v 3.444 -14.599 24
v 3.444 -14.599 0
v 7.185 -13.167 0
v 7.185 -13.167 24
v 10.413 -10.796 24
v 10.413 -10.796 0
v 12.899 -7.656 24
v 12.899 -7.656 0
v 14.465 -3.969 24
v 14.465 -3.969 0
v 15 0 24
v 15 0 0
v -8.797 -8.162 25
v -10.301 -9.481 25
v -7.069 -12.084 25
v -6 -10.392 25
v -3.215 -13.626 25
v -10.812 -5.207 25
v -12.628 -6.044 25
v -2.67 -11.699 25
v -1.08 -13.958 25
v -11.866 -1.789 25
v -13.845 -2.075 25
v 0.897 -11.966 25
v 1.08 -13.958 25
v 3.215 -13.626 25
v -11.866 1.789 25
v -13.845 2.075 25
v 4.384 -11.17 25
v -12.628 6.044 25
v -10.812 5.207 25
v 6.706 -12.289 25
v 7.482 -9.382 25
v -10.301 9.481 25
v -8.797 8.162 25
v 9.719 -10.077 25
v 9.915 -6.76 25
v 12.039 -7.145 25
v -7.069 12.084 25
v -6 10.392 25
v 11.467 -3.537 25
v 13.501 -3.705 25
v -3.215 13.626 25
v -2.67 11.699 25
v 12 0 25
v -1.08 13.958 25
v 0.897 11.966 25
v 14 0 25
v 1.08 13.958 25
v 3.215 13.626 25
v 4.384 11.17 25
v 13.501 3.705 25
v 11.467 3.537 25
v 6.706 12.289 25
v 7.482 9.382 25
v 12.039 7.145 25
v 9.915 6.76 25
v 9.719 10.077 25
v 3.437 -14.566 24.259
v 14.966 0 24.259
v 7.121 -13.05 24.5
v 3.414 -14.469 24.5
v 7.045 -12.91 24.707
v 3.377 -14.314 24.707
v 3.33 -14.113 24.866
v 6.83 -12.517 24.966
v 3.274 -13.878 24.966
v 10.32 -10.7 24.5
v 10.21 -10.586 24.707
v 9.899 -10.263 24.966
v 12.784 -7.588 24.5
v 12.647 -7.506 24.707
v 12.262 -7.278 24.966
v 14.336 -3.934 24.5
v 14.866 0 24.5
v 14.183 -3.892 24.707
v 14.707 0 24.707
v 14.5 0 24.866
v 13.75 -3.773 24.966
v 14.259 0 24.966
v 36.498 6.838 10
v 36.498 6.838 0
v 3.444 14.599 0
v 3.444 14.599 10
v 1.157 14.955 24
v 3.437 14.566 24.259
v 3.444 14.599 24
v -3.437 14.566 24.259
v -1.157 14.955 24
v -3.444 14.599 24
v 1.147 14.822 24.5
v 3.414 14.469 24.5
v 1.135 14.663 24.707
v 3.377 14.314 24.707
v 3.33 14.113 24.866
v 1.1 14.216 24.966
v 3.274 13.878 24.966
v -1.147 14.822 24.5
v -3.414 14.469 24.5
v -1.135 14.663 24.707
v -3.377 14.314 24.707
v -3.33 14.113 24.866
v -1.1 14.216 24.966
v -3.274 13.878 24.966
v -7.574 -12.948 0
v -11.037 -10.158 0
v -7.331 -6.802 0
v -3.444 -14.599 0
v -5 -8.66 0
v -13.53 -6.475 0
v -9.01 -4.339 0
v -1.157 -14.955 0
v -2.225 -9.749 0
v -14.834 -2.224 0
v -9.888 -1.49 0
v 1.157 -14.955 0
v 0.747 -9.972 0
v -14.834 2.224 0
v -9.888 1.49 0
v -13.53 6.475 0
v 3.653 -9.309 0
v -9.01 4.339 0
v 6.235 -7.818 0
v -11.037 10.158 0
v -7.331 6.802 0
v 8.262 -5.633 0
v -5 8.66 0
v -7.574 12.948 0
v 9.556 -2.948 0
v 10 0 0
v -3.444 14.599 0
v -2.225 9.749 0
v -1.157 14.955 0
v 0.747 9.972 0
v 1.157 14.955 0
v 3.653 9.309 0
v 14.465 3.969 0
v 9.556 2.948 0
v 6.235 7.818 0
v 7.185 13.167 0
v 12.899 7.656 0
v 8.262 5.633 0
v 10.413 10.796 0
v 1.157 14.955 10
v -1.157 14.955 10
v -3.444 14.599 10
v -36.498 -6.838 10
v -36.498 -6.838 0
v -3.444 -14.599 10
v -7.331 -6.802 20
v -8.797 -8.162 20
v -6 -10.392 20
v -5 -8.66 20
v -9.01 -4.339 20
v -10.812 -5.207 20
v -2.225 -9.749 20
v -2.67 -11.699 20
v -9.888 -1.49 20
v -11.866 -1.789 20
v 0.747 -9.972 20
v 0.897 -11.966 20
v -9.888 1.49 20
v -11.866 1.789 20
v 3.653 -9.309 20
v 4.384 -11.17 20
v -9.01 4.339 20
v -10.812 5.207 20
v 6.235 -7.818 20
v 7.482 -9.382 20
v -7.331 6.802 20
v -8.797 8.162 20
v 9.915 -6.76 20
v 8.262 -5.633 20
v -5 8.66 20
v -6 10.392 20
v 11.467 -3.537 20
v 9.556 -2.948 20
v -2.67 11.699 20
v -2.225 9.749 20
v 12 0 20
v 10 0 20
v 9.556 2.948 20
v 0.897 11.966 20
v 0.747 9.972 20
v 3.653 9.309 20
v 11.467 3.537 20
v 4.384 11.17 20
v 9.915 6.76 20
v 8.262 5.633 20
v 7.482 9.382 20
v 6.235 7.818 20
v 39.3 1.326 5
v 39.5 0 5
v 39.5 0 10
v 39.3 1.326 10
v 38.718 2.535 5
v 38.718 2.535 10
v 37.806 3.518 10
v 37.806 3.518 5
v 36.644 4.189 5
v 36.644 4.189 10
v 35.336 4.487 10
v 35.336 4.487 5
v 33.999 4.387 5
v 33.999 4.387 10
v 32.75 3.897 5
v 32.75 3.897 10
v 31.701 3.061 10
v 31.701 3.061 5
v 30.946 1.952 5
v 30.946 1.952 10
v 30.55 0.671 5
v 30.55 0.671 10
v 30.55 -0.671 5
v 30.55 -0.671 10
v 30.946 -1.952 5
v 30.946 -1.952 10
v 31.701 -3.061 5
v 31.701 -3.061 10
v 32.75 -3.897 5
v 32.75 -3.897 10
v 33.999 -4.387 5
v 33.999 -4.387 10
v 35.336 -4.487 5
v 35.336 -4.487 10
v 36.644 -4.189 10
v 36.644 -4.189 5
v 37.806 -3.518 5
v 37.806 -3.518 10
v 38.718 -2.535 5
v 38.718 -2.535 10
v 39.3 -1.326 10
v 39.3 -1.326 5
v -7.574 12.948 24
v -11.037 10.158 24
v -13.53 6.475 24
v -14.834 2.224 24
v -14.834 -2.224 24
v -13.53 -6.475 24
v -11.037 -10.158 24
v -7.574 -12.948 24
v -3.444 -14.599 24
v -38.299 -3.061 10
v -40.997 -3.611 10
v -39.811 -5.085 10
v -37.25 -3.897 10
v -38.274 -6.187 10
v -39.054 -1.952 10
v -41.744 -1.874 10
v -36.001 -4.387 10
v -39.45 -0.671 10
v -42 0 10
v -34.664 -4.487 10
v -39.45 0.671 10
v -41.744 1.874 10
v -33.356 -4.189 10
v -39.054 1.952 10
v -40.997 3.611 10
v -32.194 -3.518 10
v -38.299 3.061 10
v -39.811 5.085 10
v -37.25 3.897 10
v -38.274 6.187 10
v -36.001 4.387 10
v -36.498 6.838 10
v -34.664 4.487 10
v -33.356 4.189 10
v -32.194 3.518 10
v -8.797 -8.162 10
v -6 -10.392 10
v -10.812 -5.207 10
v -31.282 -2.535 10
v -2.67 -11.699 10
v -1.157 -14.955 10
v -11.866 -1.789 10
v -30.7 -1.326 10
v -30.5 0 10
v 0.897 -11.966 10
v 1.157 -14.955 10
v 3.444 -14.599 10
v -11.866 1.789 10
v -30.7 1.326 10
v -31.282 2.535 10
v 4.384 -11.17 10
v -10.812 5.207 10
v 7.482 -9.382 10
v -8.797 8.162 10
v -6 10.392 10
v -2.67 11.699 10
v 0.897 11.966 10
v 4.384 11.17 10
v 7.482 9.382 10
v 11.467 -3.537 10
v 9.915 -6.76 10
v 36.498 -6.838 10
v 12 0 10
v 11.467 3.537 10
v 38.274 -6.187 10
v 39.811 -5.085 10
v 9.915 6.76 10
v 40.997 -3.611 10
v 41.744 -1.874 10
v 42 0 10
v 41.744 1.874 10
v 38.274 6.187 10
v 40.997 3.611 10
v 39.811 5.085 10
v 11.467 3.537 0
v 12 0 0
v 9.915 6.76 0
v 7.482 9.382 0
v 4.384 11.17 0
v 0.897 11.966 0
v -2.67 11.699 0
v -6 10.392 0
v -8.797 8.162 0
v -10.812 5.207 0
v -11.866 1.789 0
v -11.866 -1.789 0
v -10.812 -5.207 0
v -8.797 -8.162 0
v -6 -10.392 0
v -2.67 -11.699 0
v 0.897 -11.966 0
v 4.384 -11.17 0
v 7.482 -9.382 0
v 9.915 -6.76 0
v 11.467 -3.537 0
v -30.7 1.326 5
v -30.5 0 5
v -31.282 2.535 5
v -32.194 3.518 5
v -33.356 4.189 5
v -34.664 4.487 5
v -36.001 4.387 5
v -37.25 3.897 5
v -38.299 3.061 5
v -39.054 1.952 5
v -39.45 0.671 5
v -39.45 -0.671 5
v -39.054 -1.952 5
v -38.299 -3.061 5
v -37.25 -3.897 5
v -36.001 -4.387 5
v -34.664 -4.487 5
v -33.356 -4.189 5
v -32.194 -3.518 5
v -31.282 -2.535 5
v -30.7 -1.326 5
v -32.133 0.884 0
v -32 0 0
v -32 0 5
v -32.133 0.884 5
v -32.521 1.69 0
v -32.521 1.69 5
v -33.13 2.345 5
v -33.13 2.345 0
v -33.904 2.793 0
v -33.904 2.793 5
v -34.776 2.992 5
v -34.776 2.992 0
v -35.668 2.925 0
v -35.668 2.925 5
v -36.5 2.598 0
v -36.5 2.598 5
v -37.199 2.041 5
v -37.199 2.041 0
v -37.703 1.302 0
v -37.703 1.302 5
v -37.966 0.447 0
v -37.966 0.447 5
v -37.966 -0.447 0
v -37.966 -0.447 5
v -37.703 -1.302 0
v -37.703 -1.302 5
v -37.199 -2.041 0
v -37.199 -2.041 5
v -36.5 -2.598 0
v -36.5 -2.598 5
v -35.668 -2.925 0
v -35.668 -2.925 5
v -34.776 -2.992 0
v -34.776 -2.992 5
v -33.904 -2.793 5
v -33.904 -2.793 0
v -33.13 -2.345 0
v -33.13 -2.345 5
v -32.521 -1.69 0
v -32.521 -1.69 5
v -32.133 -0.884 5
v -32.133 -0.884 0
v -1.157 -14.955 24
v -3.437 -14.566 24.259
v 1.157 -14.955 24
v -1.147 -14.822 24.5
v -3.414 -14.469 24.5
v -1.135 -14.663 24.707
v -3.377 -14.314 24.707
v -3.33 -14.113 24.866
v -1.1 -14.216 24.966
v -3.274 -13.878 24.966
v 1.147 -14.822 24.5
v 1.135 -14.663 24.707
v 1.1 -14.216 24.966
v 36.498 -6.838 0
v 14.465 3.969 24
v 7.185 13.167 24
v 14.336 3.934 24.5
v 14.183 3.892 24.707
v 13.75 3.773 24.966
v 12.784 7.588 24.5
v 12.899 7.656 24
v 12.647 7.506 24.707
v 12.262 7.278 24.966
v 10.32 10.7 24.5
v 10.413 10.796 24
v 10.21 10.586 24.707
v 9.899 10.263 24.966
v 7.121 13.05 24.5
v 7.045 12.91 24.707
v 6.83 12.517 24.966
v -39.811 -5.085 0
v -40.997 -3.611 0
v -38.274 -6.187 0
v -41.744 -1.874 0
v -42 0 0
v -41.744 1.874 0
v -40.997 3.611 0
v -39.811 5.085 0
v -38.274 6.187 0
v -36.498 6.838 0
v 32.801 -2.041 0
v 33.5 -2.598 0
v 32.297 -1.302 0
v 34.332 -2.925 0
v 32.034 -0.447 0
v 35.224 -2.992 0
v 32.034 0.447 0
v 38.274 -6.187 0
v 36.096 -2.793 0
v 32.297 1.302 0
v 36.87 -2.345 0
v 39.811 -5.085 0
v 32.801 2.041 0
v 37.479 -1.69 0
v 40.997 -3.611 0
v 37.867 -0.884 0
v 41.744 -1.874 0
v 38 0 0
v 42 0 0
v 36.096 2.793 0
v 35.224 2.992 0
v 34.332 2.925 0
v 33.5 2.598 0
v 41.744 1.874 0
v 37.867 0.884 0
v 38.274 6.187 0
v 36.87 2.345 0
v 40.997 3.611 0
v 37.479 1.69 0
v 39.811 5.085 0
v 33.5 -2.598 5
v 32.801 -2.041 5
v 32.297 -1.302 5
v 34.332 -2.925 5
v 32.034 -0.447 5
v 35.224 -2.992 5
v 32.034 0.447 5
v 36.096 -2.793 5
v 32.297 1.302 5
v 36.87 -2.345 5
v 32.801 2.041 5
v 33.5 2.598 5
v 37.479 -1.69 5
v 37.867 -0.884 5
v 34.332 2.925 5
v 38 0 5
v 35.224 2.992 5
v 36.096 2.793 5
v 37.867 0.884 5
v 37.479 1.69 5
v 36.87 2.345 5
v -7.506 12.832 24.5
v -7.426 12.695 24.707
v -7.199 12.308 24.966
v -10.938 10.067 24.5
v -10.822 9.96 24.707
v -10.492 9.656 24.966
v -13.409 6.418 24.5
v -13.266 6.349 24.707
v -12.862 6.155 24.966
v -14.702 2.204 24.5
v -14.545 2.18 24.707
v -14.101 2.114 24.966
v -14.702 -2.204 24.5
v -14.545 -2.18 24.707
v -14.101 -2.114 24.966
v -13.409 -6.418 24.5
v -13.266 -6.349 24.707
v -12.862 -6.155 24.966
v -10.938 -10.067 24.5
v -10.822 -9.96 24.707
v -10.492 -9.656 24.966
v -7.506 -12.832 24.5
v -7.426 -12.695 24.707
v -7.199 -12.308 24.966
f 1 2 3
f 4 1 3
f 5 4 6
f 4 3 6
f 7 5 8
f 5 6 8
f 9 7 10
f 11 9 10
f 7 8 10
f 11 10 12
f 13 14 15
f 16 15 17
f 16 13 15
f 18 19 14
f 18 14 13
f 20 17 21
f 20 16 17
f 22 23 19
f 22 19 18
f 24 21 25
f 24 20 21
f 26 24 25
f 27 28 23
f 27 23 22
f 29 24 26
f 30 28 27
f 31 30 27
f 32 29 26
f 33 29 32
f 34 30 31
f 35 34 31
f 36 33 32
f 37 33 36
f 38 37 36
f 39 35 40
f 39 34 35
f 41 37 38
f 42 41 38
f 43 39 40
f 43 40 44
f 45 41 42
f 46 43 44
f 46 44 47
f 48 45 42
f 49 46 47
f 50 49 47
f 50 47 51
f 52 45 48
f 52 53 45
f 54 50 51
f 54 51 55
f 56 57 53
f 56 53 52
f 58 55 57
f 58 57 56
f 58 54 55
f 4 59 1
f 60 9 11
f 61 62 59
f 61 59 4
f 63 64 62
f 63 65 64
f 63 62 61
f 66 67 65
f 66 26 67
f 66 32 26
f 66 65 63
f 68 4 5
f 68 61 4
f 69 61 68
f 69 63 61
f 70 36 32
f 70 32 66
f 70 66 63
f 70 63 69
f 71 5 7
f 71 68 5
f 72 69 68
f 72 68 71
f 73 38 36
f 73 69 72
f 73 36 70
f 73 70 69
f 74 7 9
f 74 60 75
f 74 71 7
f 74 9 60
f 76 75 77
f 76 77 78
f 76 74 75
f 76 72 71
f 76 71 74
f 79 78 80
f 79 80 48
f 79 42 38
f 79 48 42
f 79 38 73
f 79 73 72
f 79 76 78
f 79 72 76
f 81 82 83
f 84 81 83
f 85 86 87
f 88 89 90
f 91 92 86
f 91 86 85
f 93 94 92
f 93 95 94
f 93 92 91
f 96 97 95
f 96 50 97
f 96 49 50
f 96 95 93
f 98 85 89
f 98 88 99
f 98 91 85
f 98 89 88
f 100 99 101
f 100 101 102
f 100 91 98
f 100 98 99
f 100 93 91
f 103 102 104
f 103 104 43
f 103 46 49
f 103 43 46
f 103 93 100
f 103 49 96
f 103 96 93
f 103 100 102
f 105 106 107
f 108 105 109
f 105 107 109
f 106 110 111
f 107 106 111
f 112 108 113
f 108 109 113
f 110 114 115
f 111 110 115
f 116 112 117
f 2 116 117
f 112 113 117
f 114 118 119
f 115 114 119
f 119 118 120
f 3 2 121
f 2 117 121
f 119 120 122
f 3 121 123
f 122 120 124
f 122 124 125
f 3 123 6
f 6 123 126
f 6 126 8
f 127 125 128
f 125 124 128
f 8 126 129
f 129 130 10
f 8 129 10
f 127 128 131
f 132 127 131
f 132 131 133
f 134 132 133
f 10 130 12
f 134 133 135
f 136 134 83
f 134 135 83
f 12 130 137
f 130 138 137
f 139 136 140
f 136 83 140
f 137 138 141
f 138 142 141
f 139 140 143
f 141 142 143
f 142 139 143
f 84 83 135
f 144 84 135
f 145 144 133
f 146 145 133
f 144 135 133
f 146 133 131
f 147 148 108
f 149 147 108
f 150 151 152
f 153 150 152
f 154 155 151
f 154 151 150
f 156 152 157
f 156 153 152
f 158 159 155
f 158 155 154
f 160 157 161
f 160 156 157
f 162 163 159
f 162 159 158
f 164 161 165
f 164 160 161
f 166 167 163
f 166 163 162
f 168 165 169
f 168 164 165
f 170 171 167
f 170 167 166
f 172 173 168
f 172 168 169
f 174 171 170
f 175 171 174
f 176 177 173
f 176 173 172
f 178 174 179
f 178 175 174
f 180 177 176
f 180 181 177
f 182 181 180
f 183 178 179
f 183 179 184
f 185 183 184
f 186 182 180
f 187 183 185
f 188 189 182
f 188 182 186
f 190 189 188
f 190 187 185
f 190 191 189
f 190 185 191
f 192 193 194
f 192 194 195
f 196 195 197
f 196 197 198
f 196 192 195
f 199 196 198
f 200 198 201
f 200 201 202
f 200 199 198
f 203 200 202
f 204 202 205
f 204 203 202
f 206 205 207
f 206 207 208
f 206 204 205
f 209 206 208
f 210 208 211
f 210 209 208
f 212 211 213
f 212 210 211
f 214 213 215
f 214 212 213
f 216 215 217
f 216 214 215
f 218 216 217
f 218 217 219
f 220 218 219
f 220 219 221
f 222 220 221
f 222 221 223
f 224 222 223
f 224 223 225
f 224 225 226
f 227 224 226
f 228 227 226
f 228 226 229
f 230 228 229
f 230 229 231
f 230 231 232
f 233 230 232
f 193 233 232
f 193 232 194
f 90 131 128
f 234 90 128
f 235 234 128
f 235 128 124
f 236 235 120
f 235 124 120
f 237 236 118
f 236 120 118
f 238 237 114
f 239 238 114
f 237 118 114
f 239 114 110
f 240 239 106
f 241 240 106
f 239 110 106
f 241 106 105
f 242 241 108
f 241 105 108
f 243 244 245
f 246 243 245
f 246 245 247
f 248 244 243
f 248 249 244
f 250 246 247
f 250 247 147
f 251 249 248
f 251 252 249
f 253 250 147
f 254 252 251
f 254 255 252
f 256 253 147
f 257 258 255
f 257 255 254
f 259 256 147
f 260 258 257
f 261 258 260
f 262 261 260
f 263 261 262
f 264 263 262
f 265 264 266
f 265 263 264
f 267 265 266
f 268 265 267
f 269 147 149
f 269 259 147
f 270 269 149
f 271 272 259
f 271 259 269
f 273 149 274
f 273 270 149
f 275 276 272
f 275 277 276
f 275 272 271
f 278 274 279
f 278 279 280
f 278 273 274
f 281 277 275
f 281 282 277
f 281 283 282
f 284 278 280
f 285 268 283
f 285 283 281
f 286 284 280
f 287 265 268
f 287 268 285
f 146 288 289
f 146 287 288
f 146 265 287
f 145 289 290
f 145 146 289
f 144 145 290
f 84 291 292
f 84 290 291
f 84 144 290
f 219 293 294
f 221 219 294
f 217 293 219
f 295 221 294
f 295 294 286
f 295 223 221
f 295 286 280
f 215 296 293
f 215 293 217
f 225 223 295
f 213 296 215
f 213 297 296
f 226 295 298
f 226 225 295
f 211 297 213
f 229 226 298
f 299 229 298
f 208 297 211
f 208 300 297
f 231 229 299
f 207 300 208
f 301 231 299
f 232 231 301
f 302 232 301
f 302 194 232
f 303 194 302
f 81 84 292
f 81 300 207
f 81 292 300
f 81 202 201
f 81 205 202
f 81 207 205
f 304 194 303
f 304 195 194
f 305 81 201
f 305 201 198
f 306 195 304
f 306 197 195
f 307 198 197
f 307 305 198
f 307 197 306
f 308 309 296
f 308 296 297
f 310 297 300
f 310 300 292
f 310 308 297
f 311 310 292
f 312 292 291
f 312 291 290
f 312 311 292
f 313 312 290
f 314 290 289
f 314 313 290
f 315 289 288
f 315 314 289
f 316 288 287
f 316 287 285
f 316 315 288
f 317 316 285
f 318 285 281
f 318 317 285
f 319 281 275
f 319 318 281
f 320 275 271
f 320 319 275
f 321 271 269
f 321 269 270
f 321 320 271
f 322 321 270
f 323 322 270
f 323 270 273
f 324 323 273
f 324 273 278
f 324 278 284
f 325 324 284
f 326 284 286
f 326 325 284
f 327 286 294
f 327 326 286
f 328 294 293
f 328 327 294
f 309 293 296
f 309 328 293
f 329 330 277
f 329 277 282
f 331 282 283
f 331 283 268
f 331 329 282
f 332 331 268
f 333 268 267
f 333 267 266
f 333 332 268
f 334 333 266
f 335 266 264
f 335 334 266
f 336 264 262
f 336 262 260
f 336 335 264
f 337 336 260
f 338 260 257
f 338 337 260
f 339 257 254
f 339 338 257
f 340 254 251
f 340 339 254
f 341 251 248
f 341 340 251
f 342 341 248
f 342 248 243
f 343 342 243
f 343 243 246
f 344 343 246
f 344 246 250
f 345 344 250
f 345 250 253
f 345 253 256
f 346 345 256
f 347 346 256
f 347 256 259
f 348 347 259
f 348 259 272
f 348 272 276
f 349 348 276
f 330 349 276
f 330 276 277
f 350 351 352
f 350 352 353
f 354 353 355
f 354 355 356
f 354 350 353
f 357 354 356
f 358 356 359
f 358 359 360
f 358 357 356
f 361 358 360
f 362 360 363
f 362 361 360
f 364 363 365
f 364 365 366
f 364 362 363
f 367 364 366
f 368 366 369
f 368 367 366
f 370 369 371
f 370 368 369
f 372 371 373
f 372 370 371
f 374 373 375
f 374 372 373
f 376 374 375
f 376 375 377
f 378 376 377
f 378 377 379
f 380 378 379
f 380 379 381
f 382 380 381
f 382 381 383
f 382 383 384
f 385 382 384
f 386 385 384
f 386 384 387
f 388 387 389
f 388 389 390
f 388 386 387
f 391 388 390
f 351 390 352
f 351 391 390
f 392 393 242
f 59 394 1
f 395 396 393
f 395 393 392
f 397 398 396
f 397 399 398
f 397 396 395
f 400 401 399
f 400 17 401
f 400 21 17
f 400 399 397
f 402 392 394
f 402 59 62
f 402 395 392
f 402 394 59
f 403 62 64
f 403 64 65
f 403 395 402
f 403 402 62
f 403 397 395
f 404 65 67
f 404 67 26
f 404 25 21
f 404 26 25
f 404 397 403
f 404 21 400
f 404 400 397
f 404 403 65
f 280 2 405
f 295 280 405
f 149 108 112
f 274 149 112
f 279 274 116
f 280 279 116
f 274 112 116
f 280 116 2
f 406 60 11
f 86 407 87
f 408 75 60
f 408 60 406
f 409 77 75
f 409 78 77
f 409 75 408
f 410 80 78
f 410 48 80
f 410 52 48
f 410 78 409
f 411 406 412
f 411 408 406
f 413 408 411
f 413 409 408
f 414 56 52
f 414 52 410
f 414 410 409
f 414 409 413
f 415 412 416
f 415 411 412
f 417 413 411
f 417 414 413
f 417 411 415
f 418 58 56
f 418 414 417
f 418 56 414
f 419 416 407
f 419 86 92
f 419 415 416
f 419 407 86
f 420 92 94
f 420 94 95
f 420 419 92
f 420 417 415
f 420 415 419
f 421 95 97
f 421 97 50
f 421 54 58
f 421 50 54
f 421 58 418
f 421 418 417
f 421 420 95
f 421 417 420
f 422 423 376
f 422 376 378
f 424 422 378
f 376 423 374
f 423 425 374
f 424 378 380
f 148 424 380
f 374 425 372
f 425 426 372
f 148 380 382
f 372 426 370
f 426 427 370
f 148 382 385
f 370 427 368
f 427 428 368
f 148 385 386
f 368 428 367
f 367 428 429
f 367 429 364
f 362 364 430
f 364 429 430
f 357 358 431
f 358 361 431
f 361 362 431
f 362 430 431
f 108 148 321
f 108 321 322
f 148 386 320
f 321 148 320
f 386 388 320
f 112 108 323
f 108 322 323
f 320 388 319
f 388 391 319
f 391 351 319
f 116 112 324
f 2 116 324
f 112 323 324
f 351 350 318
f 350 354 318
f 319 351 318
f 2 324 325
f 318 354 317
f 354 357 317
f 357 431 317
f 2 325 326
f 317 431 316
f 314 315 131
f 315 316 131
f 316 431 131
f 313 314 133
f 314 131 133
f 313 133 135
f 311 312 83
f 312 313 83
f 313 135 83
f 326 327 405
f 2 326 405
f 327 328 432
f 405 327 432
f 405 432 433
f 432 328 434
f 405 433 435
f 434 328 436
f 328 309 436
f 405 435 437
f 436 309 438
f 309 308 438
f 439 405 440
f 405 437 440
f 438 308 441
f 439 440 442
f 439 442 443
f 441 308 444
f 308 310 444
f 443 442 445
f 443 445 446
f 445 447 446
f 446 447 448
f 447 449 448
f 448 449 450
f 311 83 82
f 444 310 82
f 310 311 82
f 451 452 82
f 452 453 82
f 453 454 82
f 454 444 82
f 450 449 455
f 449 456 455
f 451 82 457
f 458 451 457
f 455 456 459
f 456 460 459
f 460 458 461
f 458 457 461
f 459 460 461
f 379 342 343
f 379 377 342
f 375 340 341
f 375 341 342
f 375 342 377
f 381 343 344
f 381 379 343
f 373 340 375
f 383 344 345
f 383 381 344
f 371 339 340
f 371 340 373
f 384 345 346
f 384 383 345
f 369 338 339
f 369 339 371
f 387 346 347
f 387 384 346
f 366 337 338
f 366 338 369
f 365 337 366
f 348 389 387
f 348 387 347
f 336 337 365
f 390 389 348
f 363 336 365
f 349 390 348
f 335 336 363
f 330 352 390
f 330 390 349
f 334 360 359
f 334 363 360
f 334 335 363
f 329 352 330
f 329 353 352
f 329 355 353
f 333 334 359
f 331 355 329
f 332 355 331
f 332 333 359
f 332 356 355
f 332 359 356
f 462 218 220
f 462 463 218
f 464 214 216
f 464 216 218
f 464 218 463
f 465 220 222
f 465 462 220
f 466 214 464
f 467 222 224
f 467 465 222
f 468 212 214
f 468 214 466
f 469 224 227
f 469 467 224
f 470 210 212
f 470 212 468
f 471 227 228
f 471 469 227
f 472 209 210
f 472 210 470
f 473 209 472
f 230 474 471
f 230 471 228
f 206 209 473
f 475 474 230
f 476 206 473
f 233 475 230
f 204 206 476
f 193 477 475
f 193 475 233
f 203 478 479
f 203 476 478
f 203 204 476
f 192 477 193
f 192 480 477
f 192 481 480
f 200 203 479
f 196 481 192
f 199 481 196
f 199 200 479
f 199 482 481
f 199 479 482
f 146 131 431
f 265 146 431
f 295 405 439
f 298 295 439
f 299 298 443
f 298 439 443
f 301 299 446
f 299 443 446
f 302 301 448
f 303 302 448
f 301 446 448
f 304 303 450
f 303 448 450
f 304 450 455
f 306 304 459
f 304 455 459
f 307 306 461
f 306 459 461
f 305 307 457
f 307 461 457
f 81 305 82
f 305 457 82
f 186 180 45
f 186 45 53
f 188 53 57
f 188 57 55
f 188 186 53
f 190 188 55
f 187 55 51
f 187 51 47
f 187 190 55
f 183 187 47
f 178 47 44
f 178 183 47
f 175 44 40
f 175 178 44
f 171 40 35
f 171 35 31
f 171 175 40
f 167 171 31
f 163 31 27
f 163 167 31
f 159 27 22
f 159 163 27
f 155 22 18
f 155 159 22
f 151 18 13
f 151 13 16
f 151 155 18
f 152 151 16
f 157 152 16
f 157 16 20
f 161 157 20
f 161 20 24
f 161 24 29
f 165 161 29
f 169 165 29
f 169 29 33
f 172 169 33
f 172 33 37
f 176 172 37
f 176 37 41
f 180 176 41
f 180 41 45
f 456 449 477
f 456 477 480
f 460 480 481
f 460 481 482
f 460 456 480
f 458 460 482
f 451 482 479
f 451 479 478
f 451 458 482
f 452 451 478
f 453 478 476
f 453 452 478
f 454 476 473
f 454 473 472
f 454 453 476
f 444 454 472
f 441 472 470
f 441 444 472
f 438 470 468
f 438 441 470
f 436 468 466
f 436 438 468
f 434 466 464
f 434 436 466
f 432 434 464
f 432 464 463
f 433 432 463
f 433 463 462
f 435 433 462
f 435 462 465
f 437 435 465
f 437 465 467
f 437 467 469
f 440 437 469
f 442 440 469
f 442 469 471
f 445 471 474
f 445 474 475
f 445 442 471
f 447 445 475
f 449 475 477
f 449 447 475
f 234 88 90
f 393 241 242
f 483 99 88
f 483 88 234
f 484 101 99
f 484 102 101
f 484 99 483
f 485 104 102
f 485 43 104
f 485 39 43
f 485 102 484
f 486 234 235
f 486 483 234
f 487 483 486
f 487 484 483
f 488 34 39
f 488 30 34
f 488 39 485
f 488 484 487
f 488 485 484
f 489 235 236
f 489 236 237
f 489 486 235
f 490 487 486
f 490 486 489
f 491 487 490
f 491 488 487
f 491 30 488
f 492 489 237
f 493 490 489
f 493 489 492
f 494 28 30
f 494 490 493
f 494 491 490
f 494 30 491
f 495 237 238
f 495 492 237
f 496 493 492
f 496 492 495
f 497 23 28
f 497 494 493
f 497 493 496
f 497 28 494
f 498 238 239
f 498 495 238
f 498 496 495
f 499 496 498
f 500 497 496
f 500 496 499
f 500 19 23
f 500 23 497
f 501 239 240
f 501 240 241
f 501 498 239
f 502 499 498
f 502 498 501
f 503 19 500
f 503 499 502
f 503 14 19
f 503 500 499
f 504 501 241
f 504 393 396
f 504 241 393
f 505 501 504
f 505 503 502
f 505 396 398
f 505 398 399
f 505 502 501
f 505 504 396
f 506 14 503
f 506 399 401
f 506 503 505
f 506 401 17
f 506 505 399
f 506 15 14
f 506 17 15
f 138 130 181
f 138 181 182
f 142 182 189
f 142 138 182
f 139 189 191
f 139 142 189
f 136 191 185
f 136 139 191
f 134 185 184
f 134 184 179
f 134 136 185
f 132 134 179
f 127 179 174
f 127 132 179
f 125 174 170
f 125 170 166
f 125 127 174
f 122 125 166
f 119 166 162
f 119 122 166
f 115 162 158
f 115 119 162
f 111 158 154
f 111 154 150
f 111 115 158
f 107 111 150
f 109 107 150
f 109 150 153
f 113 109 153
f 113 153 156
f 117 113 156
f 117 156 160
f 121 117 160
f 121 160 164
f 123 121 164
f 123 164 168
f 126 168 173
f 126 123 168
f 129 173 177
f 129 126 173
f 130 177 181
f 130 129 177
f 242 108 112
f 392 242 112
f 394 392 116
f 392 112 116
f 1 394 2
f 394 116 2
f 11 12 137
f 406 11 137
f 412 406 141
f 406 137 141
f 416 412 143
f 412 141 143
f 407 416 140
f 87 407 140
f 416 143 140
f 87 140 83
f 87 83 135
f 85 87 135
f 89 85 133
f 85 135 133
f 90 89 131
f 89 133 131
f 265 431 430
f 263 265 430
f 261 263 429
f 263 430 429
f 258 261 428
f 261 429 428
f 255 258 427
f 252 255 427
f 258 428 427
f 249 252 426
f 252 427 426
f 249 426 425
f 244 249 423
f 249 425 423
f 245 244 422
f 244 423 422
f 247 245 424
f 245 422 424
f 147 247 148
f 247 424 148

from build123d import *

# Parameters (mm, degrees)
F0_R     = 12
F0_R_2   = 4.5
F1_DEPTH = 10
F2_DEPTH = 25
F0_R_3   = 10
F3_DEPTH = 20
F0_R_4   = 3
F4_DEPTH = 5
F5_R     = 1


with BuildPart() as f1:
    # F0 (on Top) → F1 (new body)
    with BuildSketch(Plane.XY):
        with BuildLine():
            ThreePointArc((3.4443996306, -14.599181867), (11.761504888, -9.3095114142), (15, 0))
            ThreePointArc((15, 0), (11.761504888, 9.3095114142), (3.4443996306, 14.599181867))
            ThreePointArc((3.4443996306, 14.599181867), (0, 15), (-3.4443996306, 14.599181867))
            ThreePointArc((-3.4443996306, 14.599181867), (-15, 0), (-3.4443996306, -14.599181867))
            ThreePointArc((-3.4443996306, -14.599181867), (0, -15), (3.4443996306, -14.599181867))
        make_face()
        Circle(F0_R, mode=Mode.SUBTRACT)
        with BuildLine():
            ThreePointArc((3.4443996306, 14.599181867), (11.761504888, 9.3095114142), (15, 0))
            ThreePointArc((15, 0), (11.761504888, -9.3095114142), (3.4443996306, -14.599181867))
            Line((3.4443996306, -14.599181867), (36.4981958522, -6.8377927132))
            ThreePointArc((36.4981958522, -6.8377927132), (42, 0), (36.4981958522, 6.8377927132))
            Line((36.4981958522, 6.8377927132), (3.4443996306, 14.599181867))
        make_face()
        with Locations((35, 0)):
            Circle(F0_R_2, mode=Mode.SUBTRACT)
        with BuildLine():
            ThreePointArc((-3.4443996306, -14.599181867), (-15, 0), (-3.4443996306, 14.599181867))
            Line((-3.4443996306, 14.599181867), (-36.4981958522, 6.8377927132))
            ThreePointArc((-36.4981958522, 6.8377927132), (-42, 0), (-36.4981958522, -6.8377927132))
            Line((-36.4981958522, -6.8377927132), (-3.4443996306, -14.599181867))
        make_face()
        with Locations((-35, 0)):
            Circle(F0_R_2, mode=Mode.SUBTRACT)
    extrude(amount=F1_DEPTH)

    # F0 (on Top) → F4 (join)
    with BuildSketch(Plane.XY):
        with Locations((-35, 0)):
            Circle(F0_R_2)
        with Locations((-35, 0)):
            Circle(F0_R_4, mode=Mode.SUBTRACT)
        with Locations((35, 0)):
            Circle(F0_R_2)
        with Locations((35, 0)):
            Circle(F0_R_4, mode=Mode.SUBTRACT)
    extrude(amount=F4_DEPTH)


with BuildPart() as f2:
    # F0 (on Top) → F2 (new body)
    with BuildSketch(Plane.XY):
        with BuildLine():
            ThreePointArc((3.4443996306, -14.599181867), (11.761504888, -9.3095114142), (15, 0))
            ThreePointArc((15, 0), (11.761504888, 9.3095114142), (3.4443996306, 14.599181867))
            ThreePointArc((3.4443996306, 14.599181867), (0, 15), (-3.4443996306, 14.599181867))
            ThreePointArc((-3.4443996306, 14.599181867), (-15, 0), (-3.4443996306, -14.599181867))
            ThreePointArc((-3.4443996306, -14.599181867), (0, -15), (3.4443996306, -14.599181867))
        make_face()
        Circle(F0_R, mode=Mode.SUBTRACT)
    extrude(amount=F2_DEPTH)

    # F0 (on Top) → F3 (join)
    with BuildSketch(Plane.XY):
        Circle(F0_R)
        Circle(F0_R_3, mode=Mode.SUBTRACT)
    extrude(amount=F3_DEPTH)

    # F5
    f5_edges = [f2.edges().sort_by_distance(p)[0] for p in [
        (-3.4444, -14.599182, 25),
    ]]
    fillet(f5_edges, radius=F5_R)


solid = Compound([f1.part, f2.part])
